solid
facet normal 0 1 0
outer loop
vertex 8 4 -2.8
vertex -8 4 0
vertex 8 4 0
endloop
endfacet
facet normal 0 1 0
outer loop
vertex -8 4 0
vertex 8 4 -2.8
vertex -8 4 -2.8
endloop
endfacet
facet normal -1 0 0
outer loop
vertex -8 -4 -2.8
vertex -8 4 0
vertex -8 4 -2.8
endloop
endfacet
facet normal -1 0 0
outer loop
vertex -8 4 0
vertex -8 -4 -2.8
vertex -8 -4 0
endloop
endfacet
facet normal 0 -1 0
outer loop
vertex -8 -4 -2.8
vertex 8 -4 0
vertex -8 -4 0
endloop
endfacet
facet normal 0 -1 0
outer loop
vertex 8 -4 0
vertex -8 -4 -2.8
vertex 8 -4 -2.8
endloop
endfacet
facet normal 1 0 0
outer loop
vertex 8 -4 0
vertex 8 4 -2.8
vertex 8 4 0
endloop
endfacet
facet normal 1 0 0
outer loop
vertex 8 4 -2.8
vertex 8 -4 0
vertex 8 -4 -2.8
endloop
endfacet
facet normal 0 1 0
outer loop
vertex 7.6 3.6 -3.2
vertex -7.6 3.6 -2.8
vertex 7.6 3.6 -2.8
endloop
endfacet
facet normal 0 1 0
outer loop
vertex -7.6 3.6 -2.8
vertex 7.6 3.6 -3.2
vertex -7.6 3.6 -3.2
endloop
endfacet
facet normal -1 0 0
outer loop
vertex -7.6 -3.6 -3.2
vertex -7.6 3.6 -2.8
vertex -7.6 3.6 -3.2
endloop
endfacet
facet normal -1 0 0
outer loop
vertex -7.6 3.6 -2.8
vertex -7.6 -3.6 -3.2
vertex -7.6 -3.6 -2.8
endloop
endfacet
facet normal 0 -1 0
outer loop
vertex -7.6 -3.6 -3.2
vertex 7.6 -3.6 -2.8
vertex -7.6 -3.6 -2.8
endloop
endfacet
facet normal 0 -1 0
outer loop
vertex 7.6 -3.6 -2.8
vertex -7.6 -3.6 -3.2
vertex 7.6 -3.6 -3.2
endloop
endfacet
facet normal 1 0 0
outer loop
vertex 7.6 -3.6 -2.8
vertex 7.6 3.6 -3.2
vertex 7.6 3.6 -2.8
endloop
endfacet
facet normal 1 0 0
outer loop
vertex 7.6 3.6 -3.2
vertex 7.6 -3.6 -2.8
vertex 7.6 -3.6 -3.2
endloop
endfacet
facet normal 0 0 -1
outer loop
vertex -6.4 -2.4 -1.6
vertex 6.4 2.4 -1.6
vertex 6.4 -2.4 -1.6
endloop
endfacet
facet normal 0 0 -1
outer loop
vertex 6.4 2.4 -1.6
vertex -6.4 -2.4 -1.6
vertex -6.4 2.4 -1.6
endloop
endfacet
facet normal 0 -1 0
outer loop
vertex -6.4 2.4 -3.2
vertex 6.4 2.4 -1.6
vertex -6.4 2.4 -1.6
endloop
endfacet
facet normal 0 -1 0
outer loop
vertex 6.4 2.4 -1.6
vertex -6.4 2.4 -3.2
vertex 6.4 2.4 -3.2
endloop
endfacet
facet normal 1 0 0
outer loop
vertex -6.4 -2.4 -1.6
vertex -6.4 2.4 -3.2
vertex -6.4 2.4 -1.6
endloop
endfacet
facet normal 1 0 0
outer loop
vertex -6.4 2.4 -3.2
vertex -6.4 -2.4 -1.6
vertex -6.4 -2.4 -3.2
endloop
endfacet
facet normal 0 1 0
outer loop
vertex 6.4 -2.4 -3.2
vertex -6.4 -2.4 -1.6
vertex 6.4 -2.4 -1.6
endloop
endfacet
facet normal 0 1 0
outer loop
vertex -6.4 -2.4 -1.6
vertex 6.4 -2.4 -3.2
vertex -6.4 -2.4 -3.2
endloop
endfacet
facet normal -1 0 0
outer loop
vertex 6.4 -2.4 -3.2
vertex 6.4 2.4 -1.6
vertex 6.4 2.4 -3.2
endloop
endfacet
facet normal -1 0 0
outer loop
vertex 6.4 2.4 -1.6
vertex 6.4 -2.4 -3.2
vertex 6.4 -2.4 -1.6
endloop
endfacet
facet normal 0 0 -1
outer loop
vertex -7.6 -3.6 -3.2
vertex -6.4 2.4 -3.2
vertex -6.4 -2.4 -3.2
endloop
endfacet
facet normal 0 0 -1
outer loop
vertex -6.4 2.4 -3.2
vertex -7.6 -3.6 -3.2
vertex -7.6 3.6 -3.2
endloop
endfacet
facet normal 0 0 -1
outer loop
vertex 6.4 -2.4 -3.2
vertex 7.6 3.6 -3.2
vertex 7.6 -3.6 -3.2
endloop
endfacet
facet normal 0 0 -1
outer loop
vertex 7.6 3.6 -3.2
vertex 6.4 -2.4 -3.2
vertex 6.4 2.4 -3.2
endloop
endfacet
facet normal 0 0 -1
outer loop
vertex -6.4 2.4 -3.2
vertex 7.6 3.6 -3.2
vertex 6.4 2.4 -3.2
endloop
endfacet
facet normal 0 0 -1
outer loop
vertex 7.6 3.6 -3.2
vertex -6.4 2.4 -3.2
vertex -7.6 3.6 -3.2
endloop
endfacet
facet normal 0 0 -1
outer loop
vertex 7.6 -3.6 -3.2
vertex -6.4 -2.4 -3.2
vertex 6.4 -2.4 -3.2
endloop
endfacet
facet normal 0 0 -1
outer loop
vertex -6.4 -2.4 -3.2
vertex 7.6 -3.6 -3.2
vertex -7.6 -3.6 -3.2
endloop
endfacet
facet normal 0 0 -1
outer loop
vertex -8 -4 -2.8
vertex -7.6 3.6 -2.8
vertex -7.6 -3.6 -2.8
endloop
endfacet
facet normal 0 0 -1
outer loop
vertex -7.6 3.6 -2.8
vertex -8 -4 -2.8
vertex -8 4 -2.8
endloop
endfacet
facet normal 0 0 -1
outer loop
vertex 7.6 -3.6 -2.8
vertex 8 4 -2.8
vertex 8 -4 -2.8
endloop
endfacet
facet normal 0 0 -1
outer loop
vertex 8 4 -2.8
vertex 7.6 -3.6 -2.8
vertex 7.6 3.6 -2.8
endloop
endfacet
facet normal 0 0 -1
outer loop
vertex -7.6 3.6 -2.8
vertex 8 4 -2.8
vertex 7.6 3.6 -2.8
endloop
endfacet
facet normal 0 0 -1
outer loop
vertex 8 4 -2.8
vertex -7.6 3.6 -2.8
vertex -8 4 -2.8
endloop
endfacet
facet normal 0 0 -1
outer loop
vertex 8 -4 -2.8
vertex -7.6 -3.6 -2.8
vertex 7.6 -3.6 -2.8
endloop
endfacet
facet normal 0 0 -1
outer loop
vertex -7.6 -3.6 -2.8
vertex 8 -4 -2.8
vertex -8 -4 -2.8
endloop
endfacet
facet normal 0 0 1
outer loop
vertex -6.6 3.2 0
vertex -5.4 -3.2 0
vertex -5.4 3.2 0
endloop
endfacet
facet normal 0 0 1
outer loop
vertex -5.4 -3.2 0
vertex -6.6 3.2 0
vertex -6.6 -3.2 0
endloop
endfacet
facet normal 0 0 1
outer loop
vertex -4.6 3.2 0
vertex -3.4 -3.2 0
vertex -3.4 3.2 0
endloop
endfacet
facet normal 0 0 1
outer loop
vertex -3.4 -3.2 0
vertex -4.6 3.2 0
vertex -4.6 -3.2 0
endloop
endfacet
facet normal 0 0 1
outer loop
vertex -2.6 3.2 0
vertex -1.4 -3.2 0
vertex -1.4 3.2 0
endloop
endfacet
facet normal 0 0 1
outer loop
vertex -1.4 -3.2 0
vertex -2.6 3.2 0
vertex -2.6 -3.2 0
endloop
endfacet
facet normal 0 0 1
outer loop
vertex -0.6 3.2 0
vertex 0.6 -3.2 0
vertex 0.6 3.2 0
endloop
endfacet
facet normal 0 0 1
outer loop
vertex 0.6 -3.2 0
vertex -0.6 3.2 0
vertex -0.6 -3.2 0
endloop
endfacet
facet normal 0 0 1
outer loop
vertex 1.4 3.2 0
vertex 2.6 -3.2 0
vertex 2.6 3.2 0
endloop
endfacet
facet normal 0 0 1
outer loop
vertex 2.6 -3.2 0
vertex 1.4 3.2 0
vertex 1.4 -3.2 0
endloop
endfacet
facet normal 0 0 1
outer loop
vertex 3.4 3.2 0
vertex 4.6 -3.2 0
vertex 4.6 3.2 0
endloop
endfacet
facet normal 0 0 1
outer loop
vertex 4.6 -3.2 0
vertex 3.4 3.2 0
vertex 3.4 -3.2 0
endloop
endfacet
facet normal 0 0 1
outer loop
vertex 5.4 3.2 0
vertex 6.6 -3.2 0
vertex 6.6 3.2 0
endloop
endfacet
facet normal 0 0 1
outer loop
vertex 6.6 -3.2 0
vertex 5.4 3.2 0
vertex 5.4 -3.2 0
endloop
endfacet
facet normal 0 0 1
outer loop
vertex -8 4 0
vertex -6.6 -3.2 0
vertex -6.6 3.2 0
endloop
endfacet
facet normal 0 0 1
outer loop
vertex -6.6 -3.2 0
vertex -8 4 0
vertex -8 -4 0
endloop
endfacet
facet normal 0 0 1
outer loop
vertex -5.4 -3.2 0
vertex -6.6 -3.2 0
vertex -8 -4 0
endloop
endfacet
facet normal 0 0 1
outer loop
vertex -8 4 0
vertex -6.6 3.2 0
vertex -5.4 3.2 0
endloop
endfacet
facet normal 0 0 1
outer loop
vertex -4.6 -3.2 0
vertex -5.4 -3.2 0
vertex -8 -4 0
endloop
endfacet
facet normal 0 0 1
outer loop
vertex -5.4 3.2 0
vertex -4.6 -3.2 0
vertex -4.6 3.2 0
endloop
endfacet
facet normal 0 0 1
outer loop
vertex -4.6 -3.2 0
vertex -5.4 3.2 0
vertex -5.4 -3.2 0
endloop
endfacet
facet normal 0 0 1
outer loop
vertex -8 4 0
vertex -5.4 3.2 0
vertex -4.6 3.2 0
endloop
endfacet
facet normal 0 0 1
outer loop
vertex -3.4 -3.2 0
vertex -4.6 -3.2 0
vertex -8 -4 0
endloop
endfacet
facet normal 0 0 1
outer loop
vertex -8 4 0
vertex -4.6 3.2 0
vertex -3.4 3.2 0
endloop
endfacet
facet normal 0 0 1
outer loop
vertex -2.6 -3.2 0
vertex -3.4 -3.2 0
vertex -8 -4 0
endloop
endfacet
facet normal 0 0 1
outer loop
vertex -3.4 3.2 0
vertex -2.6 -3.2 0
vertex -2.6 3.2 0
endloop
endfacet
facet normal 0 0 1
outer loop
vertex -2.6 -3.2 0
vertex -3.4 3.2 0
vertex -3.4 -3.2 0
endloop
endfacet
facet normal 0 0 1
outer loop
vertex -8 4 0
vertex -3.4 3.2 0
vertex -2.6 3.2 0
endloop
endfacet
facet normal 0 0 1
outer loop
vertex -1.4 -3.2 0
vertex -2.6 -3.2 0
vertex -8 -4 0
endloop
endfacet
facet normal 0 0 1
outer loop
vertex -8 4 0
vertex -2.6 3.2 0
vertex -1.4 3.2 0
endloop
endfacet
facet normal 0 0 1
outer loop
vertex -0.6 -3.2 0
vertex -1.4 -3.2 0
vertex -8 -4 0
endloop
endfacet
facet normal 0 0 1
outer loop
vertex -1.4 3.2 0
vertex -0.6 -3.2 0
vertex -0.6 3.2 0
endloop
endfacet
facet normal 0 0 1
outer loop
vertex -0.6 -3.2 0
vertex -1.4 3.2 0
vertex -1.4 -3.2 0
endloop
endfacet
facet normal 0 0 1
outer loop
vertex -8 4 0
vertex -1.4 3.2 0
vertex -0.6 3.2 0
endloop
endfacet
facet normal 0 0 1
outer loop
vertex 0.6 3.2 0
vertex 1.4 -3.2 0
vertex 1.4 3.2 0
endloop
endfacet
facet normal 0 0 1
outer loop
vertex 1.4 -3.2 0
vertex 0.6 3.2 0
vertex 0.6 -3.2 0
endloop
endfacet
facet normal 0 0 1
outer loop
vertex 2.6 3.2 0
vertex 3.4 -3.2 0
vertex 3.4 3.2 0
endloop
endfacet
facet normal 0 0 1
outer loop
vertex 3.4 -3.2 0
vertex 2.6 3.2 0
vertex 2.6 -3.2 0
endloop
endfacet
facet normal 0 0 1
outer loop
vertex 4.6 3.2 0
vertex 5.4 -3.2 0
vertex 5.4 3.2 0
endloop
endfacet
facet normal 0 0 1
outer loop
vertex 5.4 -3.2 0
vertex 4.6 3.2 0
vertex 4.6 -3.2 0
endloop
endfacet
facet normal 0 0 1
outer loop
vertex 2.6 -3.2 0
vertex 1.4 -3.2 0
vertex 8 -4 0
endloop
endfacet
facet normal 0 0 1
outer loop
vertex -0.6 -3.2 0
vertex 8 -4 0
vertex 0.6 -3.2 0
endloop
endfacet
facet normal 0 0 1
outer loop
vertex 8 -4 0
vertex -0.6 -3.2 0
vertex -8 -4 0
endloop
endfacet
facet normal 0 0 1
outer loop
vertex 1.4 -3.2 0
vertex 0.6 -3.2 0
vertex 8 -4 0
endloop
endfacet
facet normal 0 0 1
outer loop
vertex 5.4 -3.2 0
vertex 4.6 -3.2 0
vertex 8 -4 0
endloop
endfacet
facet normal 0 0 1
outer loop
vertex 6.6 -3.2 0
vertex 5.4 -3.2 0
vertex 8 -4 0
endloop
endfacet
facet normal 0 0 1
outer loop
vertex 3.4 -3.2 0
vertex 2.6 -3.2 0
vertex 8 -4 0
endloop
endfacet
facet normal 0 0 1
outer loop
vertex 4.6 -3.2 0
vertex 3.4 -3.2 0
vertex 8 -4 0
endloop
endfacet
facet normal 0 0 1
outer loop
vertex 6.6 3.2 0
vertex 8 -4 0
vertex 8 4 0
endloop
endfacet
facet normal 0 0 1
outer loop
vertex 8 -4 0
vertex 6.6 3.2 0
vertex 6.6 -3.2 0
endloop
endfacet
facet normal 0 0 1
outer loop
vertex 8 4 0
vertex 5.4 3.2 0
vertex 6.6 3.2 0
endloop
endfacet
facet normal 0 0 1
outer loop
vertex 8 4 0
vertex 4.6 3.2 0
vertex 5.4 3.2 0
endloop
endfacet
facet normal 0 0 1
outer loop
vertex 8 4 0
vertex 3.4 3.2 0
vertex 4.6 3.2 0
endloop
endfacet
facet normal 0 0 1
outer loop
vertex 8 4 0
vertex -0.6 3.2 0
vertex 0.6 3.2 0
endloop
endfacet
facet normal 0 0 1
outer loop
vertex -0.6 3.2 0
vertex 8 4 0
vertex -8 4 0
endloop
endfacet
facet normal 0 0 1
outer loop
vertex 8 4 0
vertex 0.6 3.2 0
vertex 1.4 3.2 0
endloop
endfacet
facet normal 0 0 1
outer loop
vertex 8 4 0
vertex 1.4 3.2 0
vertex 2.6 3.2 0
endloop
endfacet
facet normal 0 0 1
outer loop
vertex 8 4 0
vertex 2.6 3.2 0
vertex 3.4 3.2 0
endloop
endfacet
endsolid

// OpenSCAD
// file: ../p/box5.scad
use <../lib.scad>
function ldraw_lib__box5() = [
// 0 Box with 5 Faces and All Edges
// 0 Name: box5.dat
// 0 Author: James Jessiman
// 0 !LDRAW_ORG Primitive UPDATE 2012-01
// 0 !LICENSE Licensed under CC BY 4.0 : see CAreadme.txt
// 
// 0 BFC CERTIFY CCW
  [0,"BFC","CERTIFY"],
  [0,"BFC","CCW"],
// 
// 0 !HISTORY 2002-04-03 [sbliss] Modified for BFC compliance
// 0 !HISTORY 2002-04-25 [PTadmin] Official Update 2002-02
// 0 !HISTORY 2007-06-24 [PTadmin] Header formatted for Contributor Agreement
// 0 !HISTORY 2008-07-01 [PTadmin] Official Update 2008-01
// 0 !HISTORY 2012-02-16 [Philo] Changed to CCW
// 0 !HISTORY 2012-03-30 [PTadmin] Official Update 2012-01
// 
// 
// 2 24 1 1 1 -1 1 1
  [2,24,1,1,1,-1,1,1],
// 2 24 -1 1 1 -1 1 -1
  [2,24,-1,1,1,-1,1,-1],
// 2 24 -1 1 -1 1 1 -1
  [2,24,-1,1,-1,1,1,-1],
// 2 24 1 1 -1 1 1 1
  [2,24,1,1,-1,1,1,1],
// 2 24 1 0 1 -1 0 1
  [2,24,1,0,1,-1,0,1],
// 2 24 -1 0 1 -1 0 -1
  [2,24,-1,0,1,-1,0,-1],
// 2 24 -1 0 -1 1 0 -1
  [2,24,-1,0,-1,1,0,-1],
// 2 24 1 0 -1 1 0 1
  [2,24,1,0,-1,1,0,1],
// 2 24 1 0 1 1 1 1
  [2,24,1,0,1,1,1,1],
// 2 24 -1 0 1 -1 1 1
  [2,24,-1,0,1,-1,1,1],
// 2 24 1 0 -1 1 1 -1
  [2,24,1,0,-1,1,1,-1],
// 2 24 -1 0 -1 -1 1 -1
  [2,24,-1,0,-1,-1,1,-1],
// 4 16 -1 1 1 1 1 1 1 1 -1 -1 1 -1
  [4,16,-1,1,1,1,1,1,1,1,-1,-1,1,-1],
// 4 16 -1 1 1 -1 0 1 1 0 1 1 1 1
  [4,16,-1,1,1,-1,0,1,1,0,1,1,1,1],
// 4 16 -1 1 -1 -1 0 -1 -1 0 1 -1 1 1
  [4,16,-1,1,-1,-1,0,-1,-1,0,1,-1,1,1],
// 4 16 1 1 -1 1 0 -1 -1 0 -1 -1 1 -1
  [4,16,1,1,-1,1,0,-1,-1,0,-1,-1,1,-1],
// 4 16 1 1 1 1 0 1 1 0 -1 1 1 -1
  [4,16,1,1,1,1,0,1,1,0,-1,1,1,-1],
];
module ldraw_lib__box5(step=0, col=false, unit=2/5, alt=false, line=0.2, solid=!$preview)
    makepoly(ldraw_lib__box5(), step=step, col=col, unit=unit, alt=alt, line=line, solid=solid);
ldraw_lib__box5(line=0.2);
// file: ../p/box4.scad
use <../lib.scad>
function ldraw_lib__box4() = [
// 0 Box with 4 Faces (2 Parallel Pairs) and All Edges
// 0 Name: box4.dat
// 0 Author: James Jessiman
// 0 !LDRAW_ORG Primitive UPDATE 2012-01
// 0 !LICENSE Licensed under CC BY 4.0 : see CAreadme.txt
// 
// 0 BFC CERTIFY CCW
  [0,"BFC","CERTIFY"],
  [0,"BFC","CCW"],
// 
// 0 !HISTORY 2002-04-03 [sbliss] Modified for BFC compliance
// 0 !HISTORY 2002-04-25 [PTadmin] Official Update 2002-02
// 0 !HISTORY 2007-06-24 [PTadmin] Header formatted for Contributor Agreement
// 0 !HISTORY 2008-07-01 [PTadmin] Official Update 2008-01
// 0 !HISTORY 2012-02-16 [Philo] Changed to CCW
// 0 !HISTORY 2012-03-30 [PTadmin] Official Update 2012-01
// 
// 
// 2 24 1 1 1 -1 1 1
  [2,24,1,1,1,-1,1,1],
// 2 24 -1 1 1 -1 1 -1
  [2,24,-1,1,1,-1,1,-1],
// 2 24 -1 1 -1 1 1 -1
  [2,24,-1,1,-1,1,1,-1],
// 2 24 1 1 -1 1 1 1
  [2,24,1,1,-1,1,1,1],
// 2 24 1 0 1 -1 0 1
  [2,24,1,0,1,-1,0,1],
// 2 24 -1 0 1 -1 0 -1
  [2,24,-1,0,1,-1,0,-1],
// 2 24 -1 0 -1 1 0 -1
  [2,24,-1,0,-1,1,0,-1],
// 2 24 1 0 -1 1 0 1
  [2,24,1,0,-1,1,0,1],
// 2 24 1 0 1 1 1 1
  [2,24,1,0,1,1,1,1],
// 2 24 -1 0 1 -1 1 1
  [2,24,-1,0,1,-1,1,1],
// 2 24 1 0 -1 1 1 -1
  [2,24,1,0,-1,1,1,-1],
// 2 24 -1 0 -1 -1 1 -1
  [2,24,-1,0,-1,-1,1,-1],
// 4 16 -1 1 1 -1 0 1 1 0 1 1 1 1
  [4,16,-1,1,1,-1,0,1,1,0,1,1,1,1],
// 4 16 -1 1 -1 -1 0 -1 -1 0 1 -1 1 1
  [4,16,-1,1,-1,-1,0,-1,-1,0,1,-1,1,1],
// 4 16 1 1 -1 1 0 -1 -1 0 -1 -1 1 -1
  [4,16,1,1,-1,1,0,-1,-1,0,-1,-1,1,-1],
// 4 16 1 1 1 1 0 1 1 0 -1 1 1 -1
  [4,16,1,1,1,1,0,1,1,0,-1,1,1,-1],
];
module ldraw_lib__box4(step=0, col=false, unit=2/5, alt=false, line=0.2, solid=!$preview)
    makepoly(ldraw_lib__box4(), step=step, col=col, unit=unit, alt=alt, line=line, solid=solid);
ldraw_lib__box4(line=0.2);
// file: s/3069bs01.scad
use <../../lib.scad>
use <../../p/box4.scad>
use <../../p/box5.scad>
function ldraw_lib__s__3069bs01() = [
// 0 ~Tile  1 x  2 with Groove without Top Face
// 0 Name: s\3069bs01.dat
// 0 Author: Santeri Piippo [arezey]
// 0 !LDRAW_ORG Subpart UPDATE 2010-02
// 0 !LICENSE Licensed under CC BY 4.0 : see CAreadme.txt
// 
// 0 BFC CERTIFY CCW
  [0,"BFC","CERTIFY"],
  [0,"BFC","CCW"],
// 
// 0 !HISTORY 2010-07-05 [PTadmin] Official Update 2010-02
// 
// 
// 1 16 0 0 0 20 0 0 0 7 0 0 0 10 box4.dat
  [1,16,0,0,0,20,0,0,0,7,0,0,0,10, ldraw_lib__box4()],
// 1 16 0 7 0 19 0 0 0 1 0 0 0 9 box4.dat
  [1,16,0,7,0,19,0,0,0,1,0,0,0,9, ldraw_lib__box4()],
// 0 BFC INVERTNEXT
  [0,"BFC","INVERTNEXT"],
// 1 16 0 8 0 16 0 0 0 -4 0 0 0 6 box5.dat
  [1,16,0,8,0,16,0,0,0,-4,0,0,0,6, ldraw_lib__box5()],
// 4 16 -19 8 9 -16 8 6 -16 8 -6 -19 8 -9
  [4,16,-19,8,9,-16,8,6,-16,8,-6,-19,8,-9],
// 4 16 19 8 -9 16 8 -6 16 8 6 19 8 9
  [4,16,19,8,-9,16,8,-6,16,8,6,19,8,9],
// 4 16 19 8 9 16 8 6 -16 8 6 -19 8 9
  [4,16,19,8,9,16,8,6,-16,8,6,-19,8,9],
// 4 16 -19 8 -9 -16 8 -6 16 8 -6 19 8 -9
  [4,16,-19,8,-9,-16,8,-6,16,8,-6,19,8,-9],
// 4 16 -20 7 10 -19 7 9 -19 7 -9 -20 7 -10
  [4,16,-20,7,10,-19,7,9,-19,7,-9,-20,7,-10],
// 4 16 20 7 -10 19 7 -9 19 7 9 20 7 10
  [4,16,20,7,-10,19,7,-9,19,7,9,20,7,10],
// 4 16 20 7 10 19 7 9 -19 7 9 -20 7 10
  [4,16,20,7,10,19,7,9,-19,7,9,-20,7,10],
// 4 16 -20 7 -10 -19 7 -9 19 7 -9 20 7 -10
  [4,16,-20,7,-10,-19,7,-9,19,7,-9,20,7,-10],
// 0 //
];
module ldraw_lib__s__3069bs01(step=0, col=false, unit=2/5, alt=false, line=0.2, solid=!$preview)
    makepoly(ldraw_lib__s__3069bs01(), step=step, col=col, unit=unit, alt=alt, line=line, solid=solid);
ldraw_lib__s__3069bs01(line=0.2);
// main file
use <../lib.scad>
use <s/3069bs01.scad>
function ldraw_lib__3069bp05() = [
// 0 Tile  1 x  2 with Black Grille with  7 Stripes Pattern
// 0 Name: 3069bp05.dat
// 0 Author: James Jessiman
// 0 !LDRAW_ORG Part UPDATE 2019-02
// 0 !LICENSE Licensed under CC BY 4.0 : see CAreadme.txt
// 
// 0 BFC CERTIFY CCW
  [0,"BFC","CERTIFY"],
  [0,"BFC","CCW"],
// 
// 0 !HISTORY 2002-02-18 [PTadmin] Official Update 2002-01
// 0 !HISTORY 2003-06-06 [jriley] BFC compliancy
// 0 !HISTORY 2003-12-19 [PTadmin] Official Update 2003-03
// 0 !HISTORY 2007-06-13 [PTadmin] Header formatted for Contributor Agreement
// 0 !HISTORY 2008-07-01 [PTadmin] Official Update 2008-01
// 0 !HISTORY 2009-08-13 [anathema] Removed edge-lines from pattern
// 0 !HISTORY 2009-12-29 [PTadmin] Official Update 2009-03
// 0 !HISTORY 2019-06-20 [Darats] Changed description, Removed T-junctions
// 0 !HISTORY 2019-09-09 [PTadmin] Official Update 2019-02
// 
// 
// 1 16 0 0 0 1 0 0 0 1 0 0 0 1 s\3069bs01.dat
  [1,16,0,0,0,1,0,0,0,1,0,0,0,1, ldraw_lib__s__3069bs01()],
// 4 0 -16.5 0 8 -16.5 0 -8 -13.5 0 -8 -13.5 0 8
  [4,0,-16.5,0,8,-16.5,0,-8,-13.5,0,-8,-13.5,0,8],
// 4 0 -11.5 0 8 -11.5 0 -8 -8.5 0 -8 -8.5 0 8
  [4,0,-11.5,0,8,-11.5,0,-8,-8.5,0,-8,-8.5,0,8],
// 4 0 -6.5 0 8 -6.5 0 -8 -3.5 0 -8 -3.5 0 8
  [4,0,-6.5,0,8,-6.5,0,-8,-3.5,0,-8,-3.5,0,8],
// 4 0 -1.5 0 8 -1.5 0 -8 1.5 0 -8 1.5 0 8
  [4,0,-1.5,0,8,-1.5,0,-8,1.5,0,-8,1.5,0,8],
// 4 0 3.5 0 8 3.5 0 -8 6.5 0 -8 6.5 0 8
  [4,0,3.5,0,8,3.5,0,-8,6.5,0,-8,6.5,0,8],
// 4 0 8.5 0 8 8.5 0 -8 11.5 0 -8 11.5 0 8
  [4,0,8.5,0,8,8.5,0,-8,11.5,0,-8,11.5,0,8],
// 4 0 13.5 0 8 13.5 0 -8 16.5 0 -8 16.5 0 8
  [4,0,13.5,0,8,13.5,0,-8,16.5,0,-8,16.5,0,8],
// 4 16 -20 0 -10 -16.5 0 -8 -16.5 0 8 -20 0 10
  [4,16,-20,0,-10,-16.5,0,-8,-16.5,0,8,-20,0,10],
// 3 16 -13.5 0 -8 -16.5 0 -8 -20 0 -10
  [3,16,-13.5,0,-8,-16.5,0,-8,-20,0,-10],
// 3 16 -20 0 10 -16.5 0 8 -13.5 0 8
  [3,16,-20,0,10,-16.5,0,8,-13.5,0,8],
// 3 16 -11.5 0 -8 -13.5 0 -8 -20 0 -10
  [3,16,-11.5,0,-8,-13.5,0,-8,-20,0,-10],
// 4 16 -13.5 0 8 -13.5 0 -8 -11.5 0 -8 -11.5 0 8
  [4,16,-13.5,0,8,-13.5,0,-8,-11.5,0,-8,-11.5,0,8],
// 3 16 -20 0 10 -13.5 0 8 -11.5 0 8
  [3,16,-20,0,10,-13.5,0,8,-11.5,0,8],
// 3 16 -8.5 0 -8 -11.5 0 -8 -20 0 -10
  [3,16,-8.5,0,-8,-11.5,0,-8,-20,0,-10],
// 3 16 -20 0 10 -11.5 0 8 -8.5 0 8
  [3,16,-20,0,10,-11.5,0,8,-8.5,0,8],
// 3 16 -6.5 0 -8 -8.5 0 -8 -20 0 -10
  [3,16,-6.5,0,-8,-8.5,0,-8,-20,0,-10],
// 4 16 -8.5 0 8 -8.5 0 -8 -6.5 0 -8 -6.5 0 8
  [4,16,-8.5,0,8,-8.5,0,-8,-6.5,0,-8,-6.5,0,8],
// 3 16 -20 0 10 -8.5 0 8 -6.5 0 8
  [3,16,-20,0,10,-8.5,0,8,-6.5,0,8],
// 3 16 -3.5 0 -8 -6.5 0 -8 -20 0 -10
  [3,16,-3.5,0,-8,-6.5,0,-8,-20,0,-10],
// 3 16 -20 0 10 -6.5 0 8 -3.5 0 8
  [3,16,-20,0,10,-6.5,0,8,-3.5,0,8],
// 3 16 -1.5 0 -8 -3.5 0 -8 -20 0 -10
  [3,16,-1.5,0,-8,-3.5,0,-8,-20,0,-10],
// 4 16 -3.5 0 8 -3.5 0 -8 -1.5 0 -8 -1.5 0 8
  [4,16,-3.5,0,8,-3.5,0,-8,-1.5,0,-8,-1.5,0,8],
// 3 16 -20 0 10 -3.5 0 8 -1.5 0 8
  [3,16,-20,0,10,-3.5,0,8,-1.5,0,8],
// 4 16 1.5 0 8 1.5 0 -8 3.5 0 -8 3.5 0 8
  [4,16,1.5,0,8,1.5,0,-8,3.5,0,-8,3.5,0,8],
// 4 16 6.5 0 8 6.5 0 -8 8.5 0 -8 8.5 0 8
  [4,16,6.5,0,8,6.5,0,-8,8.5,0,-8,8.5,0,8],
// 4 16 11.5 0 8 11.5 0 -8 13.5 0 -8 13.5 0 8
  [4,16,11.5,0,8,11.5,0,-8,13.5,0,-8,13.5,0,8],
// 3 16 6.5 0 -8 3.5 0 -8 20 0 -10
  [3,16,6.5,0,-8,3.5,0,-8,20,0,-10],
// 4 16 1.5 0 -8 -1.5 0 -8 -20 0 -10 20 0 -10
  [4,16,1.5,0,-8,-1.5,0,-8,-20,0,-10,20,0,-10],
// 3 16 3.5 0 -8 1.5 0 -8 20 0 -10
  [3,16,3.5,0,-8,1.5,0,-8,20,0,-10],
// 3 16 13.5 0 -8 11.5 0 -8 20 0 -10
  [3,16,13.5,0,-8,11.5,0,-8,20,0,-10],
// 3 16 16.5 0 -8 13.5 0 -8 20 0 -10
  [3,16,16.5,0,-8,13.5,0,-8,20,0,-10],
// 3 16 8.5 0 -8 6.5 0 -8 20 0 -10
  [3,16,8.5,0,-8,6.5,0,-8,20,0,-10],
// 3 16 11.5 0 -8 8.5 0 -8 20 0 -10
  [3,16,11.5,0,-8,8.5,0,-8,20,0,-10],
// 4 16 20 0 10 16.5 0 8 16.5 0 -8 20 0 -10
  [4,16,20,0,10,16.5,0,8,16.5,0,-8,20,0,-10],
// 3 16 20 0 10 13.5 0 8 16.5 0 8
  [3,16,20,0,10,13.5,0,8,16.5,0,8],
// 3 16 20 0 10 11.5 0 8 13.5 0 8
  [3,16,20,0,10,11.5,0,8,13.5,0,8],
// 3 16 20 0 10 8.5 0 8 11.5 0 8
  [3,16,20,0,10,8.5,0,8,11.5,0,8],
// 4 16 -20 0 10 -1.5 0 8 1.5 0 8 20 0 10
  [4,16,-20,0,10,-1.5,0,8,1.5,0,8,20,0,10],
// 3 16 20 0 10 1.5 0 8 3.5 0 8
  [3,16,20,0,10,1.5,0,8,3.5,0,8],
// 3 16 20 0 10 3.5 0 8 6.5 0 8
  [3,16,20,0,10,3.5,0,8,6.5,0,8],
// 3 16 20 0 10 6.5 0 8 8.5 0 8
  [3,16,20,0,10,6.5,0,8,8.5,0,8],
];
module ldraw_lib__3069bp05(step=0, col=false, unit=2/5, alt=false, line=0.2, solid=!$preview)
    makepoly(ldraw_lib__3069bp05(), step=step, col=col, unit=unit, alt=alt, line=line, solid=solid);
ldraw_lib__3069bp05(line=0.2);
